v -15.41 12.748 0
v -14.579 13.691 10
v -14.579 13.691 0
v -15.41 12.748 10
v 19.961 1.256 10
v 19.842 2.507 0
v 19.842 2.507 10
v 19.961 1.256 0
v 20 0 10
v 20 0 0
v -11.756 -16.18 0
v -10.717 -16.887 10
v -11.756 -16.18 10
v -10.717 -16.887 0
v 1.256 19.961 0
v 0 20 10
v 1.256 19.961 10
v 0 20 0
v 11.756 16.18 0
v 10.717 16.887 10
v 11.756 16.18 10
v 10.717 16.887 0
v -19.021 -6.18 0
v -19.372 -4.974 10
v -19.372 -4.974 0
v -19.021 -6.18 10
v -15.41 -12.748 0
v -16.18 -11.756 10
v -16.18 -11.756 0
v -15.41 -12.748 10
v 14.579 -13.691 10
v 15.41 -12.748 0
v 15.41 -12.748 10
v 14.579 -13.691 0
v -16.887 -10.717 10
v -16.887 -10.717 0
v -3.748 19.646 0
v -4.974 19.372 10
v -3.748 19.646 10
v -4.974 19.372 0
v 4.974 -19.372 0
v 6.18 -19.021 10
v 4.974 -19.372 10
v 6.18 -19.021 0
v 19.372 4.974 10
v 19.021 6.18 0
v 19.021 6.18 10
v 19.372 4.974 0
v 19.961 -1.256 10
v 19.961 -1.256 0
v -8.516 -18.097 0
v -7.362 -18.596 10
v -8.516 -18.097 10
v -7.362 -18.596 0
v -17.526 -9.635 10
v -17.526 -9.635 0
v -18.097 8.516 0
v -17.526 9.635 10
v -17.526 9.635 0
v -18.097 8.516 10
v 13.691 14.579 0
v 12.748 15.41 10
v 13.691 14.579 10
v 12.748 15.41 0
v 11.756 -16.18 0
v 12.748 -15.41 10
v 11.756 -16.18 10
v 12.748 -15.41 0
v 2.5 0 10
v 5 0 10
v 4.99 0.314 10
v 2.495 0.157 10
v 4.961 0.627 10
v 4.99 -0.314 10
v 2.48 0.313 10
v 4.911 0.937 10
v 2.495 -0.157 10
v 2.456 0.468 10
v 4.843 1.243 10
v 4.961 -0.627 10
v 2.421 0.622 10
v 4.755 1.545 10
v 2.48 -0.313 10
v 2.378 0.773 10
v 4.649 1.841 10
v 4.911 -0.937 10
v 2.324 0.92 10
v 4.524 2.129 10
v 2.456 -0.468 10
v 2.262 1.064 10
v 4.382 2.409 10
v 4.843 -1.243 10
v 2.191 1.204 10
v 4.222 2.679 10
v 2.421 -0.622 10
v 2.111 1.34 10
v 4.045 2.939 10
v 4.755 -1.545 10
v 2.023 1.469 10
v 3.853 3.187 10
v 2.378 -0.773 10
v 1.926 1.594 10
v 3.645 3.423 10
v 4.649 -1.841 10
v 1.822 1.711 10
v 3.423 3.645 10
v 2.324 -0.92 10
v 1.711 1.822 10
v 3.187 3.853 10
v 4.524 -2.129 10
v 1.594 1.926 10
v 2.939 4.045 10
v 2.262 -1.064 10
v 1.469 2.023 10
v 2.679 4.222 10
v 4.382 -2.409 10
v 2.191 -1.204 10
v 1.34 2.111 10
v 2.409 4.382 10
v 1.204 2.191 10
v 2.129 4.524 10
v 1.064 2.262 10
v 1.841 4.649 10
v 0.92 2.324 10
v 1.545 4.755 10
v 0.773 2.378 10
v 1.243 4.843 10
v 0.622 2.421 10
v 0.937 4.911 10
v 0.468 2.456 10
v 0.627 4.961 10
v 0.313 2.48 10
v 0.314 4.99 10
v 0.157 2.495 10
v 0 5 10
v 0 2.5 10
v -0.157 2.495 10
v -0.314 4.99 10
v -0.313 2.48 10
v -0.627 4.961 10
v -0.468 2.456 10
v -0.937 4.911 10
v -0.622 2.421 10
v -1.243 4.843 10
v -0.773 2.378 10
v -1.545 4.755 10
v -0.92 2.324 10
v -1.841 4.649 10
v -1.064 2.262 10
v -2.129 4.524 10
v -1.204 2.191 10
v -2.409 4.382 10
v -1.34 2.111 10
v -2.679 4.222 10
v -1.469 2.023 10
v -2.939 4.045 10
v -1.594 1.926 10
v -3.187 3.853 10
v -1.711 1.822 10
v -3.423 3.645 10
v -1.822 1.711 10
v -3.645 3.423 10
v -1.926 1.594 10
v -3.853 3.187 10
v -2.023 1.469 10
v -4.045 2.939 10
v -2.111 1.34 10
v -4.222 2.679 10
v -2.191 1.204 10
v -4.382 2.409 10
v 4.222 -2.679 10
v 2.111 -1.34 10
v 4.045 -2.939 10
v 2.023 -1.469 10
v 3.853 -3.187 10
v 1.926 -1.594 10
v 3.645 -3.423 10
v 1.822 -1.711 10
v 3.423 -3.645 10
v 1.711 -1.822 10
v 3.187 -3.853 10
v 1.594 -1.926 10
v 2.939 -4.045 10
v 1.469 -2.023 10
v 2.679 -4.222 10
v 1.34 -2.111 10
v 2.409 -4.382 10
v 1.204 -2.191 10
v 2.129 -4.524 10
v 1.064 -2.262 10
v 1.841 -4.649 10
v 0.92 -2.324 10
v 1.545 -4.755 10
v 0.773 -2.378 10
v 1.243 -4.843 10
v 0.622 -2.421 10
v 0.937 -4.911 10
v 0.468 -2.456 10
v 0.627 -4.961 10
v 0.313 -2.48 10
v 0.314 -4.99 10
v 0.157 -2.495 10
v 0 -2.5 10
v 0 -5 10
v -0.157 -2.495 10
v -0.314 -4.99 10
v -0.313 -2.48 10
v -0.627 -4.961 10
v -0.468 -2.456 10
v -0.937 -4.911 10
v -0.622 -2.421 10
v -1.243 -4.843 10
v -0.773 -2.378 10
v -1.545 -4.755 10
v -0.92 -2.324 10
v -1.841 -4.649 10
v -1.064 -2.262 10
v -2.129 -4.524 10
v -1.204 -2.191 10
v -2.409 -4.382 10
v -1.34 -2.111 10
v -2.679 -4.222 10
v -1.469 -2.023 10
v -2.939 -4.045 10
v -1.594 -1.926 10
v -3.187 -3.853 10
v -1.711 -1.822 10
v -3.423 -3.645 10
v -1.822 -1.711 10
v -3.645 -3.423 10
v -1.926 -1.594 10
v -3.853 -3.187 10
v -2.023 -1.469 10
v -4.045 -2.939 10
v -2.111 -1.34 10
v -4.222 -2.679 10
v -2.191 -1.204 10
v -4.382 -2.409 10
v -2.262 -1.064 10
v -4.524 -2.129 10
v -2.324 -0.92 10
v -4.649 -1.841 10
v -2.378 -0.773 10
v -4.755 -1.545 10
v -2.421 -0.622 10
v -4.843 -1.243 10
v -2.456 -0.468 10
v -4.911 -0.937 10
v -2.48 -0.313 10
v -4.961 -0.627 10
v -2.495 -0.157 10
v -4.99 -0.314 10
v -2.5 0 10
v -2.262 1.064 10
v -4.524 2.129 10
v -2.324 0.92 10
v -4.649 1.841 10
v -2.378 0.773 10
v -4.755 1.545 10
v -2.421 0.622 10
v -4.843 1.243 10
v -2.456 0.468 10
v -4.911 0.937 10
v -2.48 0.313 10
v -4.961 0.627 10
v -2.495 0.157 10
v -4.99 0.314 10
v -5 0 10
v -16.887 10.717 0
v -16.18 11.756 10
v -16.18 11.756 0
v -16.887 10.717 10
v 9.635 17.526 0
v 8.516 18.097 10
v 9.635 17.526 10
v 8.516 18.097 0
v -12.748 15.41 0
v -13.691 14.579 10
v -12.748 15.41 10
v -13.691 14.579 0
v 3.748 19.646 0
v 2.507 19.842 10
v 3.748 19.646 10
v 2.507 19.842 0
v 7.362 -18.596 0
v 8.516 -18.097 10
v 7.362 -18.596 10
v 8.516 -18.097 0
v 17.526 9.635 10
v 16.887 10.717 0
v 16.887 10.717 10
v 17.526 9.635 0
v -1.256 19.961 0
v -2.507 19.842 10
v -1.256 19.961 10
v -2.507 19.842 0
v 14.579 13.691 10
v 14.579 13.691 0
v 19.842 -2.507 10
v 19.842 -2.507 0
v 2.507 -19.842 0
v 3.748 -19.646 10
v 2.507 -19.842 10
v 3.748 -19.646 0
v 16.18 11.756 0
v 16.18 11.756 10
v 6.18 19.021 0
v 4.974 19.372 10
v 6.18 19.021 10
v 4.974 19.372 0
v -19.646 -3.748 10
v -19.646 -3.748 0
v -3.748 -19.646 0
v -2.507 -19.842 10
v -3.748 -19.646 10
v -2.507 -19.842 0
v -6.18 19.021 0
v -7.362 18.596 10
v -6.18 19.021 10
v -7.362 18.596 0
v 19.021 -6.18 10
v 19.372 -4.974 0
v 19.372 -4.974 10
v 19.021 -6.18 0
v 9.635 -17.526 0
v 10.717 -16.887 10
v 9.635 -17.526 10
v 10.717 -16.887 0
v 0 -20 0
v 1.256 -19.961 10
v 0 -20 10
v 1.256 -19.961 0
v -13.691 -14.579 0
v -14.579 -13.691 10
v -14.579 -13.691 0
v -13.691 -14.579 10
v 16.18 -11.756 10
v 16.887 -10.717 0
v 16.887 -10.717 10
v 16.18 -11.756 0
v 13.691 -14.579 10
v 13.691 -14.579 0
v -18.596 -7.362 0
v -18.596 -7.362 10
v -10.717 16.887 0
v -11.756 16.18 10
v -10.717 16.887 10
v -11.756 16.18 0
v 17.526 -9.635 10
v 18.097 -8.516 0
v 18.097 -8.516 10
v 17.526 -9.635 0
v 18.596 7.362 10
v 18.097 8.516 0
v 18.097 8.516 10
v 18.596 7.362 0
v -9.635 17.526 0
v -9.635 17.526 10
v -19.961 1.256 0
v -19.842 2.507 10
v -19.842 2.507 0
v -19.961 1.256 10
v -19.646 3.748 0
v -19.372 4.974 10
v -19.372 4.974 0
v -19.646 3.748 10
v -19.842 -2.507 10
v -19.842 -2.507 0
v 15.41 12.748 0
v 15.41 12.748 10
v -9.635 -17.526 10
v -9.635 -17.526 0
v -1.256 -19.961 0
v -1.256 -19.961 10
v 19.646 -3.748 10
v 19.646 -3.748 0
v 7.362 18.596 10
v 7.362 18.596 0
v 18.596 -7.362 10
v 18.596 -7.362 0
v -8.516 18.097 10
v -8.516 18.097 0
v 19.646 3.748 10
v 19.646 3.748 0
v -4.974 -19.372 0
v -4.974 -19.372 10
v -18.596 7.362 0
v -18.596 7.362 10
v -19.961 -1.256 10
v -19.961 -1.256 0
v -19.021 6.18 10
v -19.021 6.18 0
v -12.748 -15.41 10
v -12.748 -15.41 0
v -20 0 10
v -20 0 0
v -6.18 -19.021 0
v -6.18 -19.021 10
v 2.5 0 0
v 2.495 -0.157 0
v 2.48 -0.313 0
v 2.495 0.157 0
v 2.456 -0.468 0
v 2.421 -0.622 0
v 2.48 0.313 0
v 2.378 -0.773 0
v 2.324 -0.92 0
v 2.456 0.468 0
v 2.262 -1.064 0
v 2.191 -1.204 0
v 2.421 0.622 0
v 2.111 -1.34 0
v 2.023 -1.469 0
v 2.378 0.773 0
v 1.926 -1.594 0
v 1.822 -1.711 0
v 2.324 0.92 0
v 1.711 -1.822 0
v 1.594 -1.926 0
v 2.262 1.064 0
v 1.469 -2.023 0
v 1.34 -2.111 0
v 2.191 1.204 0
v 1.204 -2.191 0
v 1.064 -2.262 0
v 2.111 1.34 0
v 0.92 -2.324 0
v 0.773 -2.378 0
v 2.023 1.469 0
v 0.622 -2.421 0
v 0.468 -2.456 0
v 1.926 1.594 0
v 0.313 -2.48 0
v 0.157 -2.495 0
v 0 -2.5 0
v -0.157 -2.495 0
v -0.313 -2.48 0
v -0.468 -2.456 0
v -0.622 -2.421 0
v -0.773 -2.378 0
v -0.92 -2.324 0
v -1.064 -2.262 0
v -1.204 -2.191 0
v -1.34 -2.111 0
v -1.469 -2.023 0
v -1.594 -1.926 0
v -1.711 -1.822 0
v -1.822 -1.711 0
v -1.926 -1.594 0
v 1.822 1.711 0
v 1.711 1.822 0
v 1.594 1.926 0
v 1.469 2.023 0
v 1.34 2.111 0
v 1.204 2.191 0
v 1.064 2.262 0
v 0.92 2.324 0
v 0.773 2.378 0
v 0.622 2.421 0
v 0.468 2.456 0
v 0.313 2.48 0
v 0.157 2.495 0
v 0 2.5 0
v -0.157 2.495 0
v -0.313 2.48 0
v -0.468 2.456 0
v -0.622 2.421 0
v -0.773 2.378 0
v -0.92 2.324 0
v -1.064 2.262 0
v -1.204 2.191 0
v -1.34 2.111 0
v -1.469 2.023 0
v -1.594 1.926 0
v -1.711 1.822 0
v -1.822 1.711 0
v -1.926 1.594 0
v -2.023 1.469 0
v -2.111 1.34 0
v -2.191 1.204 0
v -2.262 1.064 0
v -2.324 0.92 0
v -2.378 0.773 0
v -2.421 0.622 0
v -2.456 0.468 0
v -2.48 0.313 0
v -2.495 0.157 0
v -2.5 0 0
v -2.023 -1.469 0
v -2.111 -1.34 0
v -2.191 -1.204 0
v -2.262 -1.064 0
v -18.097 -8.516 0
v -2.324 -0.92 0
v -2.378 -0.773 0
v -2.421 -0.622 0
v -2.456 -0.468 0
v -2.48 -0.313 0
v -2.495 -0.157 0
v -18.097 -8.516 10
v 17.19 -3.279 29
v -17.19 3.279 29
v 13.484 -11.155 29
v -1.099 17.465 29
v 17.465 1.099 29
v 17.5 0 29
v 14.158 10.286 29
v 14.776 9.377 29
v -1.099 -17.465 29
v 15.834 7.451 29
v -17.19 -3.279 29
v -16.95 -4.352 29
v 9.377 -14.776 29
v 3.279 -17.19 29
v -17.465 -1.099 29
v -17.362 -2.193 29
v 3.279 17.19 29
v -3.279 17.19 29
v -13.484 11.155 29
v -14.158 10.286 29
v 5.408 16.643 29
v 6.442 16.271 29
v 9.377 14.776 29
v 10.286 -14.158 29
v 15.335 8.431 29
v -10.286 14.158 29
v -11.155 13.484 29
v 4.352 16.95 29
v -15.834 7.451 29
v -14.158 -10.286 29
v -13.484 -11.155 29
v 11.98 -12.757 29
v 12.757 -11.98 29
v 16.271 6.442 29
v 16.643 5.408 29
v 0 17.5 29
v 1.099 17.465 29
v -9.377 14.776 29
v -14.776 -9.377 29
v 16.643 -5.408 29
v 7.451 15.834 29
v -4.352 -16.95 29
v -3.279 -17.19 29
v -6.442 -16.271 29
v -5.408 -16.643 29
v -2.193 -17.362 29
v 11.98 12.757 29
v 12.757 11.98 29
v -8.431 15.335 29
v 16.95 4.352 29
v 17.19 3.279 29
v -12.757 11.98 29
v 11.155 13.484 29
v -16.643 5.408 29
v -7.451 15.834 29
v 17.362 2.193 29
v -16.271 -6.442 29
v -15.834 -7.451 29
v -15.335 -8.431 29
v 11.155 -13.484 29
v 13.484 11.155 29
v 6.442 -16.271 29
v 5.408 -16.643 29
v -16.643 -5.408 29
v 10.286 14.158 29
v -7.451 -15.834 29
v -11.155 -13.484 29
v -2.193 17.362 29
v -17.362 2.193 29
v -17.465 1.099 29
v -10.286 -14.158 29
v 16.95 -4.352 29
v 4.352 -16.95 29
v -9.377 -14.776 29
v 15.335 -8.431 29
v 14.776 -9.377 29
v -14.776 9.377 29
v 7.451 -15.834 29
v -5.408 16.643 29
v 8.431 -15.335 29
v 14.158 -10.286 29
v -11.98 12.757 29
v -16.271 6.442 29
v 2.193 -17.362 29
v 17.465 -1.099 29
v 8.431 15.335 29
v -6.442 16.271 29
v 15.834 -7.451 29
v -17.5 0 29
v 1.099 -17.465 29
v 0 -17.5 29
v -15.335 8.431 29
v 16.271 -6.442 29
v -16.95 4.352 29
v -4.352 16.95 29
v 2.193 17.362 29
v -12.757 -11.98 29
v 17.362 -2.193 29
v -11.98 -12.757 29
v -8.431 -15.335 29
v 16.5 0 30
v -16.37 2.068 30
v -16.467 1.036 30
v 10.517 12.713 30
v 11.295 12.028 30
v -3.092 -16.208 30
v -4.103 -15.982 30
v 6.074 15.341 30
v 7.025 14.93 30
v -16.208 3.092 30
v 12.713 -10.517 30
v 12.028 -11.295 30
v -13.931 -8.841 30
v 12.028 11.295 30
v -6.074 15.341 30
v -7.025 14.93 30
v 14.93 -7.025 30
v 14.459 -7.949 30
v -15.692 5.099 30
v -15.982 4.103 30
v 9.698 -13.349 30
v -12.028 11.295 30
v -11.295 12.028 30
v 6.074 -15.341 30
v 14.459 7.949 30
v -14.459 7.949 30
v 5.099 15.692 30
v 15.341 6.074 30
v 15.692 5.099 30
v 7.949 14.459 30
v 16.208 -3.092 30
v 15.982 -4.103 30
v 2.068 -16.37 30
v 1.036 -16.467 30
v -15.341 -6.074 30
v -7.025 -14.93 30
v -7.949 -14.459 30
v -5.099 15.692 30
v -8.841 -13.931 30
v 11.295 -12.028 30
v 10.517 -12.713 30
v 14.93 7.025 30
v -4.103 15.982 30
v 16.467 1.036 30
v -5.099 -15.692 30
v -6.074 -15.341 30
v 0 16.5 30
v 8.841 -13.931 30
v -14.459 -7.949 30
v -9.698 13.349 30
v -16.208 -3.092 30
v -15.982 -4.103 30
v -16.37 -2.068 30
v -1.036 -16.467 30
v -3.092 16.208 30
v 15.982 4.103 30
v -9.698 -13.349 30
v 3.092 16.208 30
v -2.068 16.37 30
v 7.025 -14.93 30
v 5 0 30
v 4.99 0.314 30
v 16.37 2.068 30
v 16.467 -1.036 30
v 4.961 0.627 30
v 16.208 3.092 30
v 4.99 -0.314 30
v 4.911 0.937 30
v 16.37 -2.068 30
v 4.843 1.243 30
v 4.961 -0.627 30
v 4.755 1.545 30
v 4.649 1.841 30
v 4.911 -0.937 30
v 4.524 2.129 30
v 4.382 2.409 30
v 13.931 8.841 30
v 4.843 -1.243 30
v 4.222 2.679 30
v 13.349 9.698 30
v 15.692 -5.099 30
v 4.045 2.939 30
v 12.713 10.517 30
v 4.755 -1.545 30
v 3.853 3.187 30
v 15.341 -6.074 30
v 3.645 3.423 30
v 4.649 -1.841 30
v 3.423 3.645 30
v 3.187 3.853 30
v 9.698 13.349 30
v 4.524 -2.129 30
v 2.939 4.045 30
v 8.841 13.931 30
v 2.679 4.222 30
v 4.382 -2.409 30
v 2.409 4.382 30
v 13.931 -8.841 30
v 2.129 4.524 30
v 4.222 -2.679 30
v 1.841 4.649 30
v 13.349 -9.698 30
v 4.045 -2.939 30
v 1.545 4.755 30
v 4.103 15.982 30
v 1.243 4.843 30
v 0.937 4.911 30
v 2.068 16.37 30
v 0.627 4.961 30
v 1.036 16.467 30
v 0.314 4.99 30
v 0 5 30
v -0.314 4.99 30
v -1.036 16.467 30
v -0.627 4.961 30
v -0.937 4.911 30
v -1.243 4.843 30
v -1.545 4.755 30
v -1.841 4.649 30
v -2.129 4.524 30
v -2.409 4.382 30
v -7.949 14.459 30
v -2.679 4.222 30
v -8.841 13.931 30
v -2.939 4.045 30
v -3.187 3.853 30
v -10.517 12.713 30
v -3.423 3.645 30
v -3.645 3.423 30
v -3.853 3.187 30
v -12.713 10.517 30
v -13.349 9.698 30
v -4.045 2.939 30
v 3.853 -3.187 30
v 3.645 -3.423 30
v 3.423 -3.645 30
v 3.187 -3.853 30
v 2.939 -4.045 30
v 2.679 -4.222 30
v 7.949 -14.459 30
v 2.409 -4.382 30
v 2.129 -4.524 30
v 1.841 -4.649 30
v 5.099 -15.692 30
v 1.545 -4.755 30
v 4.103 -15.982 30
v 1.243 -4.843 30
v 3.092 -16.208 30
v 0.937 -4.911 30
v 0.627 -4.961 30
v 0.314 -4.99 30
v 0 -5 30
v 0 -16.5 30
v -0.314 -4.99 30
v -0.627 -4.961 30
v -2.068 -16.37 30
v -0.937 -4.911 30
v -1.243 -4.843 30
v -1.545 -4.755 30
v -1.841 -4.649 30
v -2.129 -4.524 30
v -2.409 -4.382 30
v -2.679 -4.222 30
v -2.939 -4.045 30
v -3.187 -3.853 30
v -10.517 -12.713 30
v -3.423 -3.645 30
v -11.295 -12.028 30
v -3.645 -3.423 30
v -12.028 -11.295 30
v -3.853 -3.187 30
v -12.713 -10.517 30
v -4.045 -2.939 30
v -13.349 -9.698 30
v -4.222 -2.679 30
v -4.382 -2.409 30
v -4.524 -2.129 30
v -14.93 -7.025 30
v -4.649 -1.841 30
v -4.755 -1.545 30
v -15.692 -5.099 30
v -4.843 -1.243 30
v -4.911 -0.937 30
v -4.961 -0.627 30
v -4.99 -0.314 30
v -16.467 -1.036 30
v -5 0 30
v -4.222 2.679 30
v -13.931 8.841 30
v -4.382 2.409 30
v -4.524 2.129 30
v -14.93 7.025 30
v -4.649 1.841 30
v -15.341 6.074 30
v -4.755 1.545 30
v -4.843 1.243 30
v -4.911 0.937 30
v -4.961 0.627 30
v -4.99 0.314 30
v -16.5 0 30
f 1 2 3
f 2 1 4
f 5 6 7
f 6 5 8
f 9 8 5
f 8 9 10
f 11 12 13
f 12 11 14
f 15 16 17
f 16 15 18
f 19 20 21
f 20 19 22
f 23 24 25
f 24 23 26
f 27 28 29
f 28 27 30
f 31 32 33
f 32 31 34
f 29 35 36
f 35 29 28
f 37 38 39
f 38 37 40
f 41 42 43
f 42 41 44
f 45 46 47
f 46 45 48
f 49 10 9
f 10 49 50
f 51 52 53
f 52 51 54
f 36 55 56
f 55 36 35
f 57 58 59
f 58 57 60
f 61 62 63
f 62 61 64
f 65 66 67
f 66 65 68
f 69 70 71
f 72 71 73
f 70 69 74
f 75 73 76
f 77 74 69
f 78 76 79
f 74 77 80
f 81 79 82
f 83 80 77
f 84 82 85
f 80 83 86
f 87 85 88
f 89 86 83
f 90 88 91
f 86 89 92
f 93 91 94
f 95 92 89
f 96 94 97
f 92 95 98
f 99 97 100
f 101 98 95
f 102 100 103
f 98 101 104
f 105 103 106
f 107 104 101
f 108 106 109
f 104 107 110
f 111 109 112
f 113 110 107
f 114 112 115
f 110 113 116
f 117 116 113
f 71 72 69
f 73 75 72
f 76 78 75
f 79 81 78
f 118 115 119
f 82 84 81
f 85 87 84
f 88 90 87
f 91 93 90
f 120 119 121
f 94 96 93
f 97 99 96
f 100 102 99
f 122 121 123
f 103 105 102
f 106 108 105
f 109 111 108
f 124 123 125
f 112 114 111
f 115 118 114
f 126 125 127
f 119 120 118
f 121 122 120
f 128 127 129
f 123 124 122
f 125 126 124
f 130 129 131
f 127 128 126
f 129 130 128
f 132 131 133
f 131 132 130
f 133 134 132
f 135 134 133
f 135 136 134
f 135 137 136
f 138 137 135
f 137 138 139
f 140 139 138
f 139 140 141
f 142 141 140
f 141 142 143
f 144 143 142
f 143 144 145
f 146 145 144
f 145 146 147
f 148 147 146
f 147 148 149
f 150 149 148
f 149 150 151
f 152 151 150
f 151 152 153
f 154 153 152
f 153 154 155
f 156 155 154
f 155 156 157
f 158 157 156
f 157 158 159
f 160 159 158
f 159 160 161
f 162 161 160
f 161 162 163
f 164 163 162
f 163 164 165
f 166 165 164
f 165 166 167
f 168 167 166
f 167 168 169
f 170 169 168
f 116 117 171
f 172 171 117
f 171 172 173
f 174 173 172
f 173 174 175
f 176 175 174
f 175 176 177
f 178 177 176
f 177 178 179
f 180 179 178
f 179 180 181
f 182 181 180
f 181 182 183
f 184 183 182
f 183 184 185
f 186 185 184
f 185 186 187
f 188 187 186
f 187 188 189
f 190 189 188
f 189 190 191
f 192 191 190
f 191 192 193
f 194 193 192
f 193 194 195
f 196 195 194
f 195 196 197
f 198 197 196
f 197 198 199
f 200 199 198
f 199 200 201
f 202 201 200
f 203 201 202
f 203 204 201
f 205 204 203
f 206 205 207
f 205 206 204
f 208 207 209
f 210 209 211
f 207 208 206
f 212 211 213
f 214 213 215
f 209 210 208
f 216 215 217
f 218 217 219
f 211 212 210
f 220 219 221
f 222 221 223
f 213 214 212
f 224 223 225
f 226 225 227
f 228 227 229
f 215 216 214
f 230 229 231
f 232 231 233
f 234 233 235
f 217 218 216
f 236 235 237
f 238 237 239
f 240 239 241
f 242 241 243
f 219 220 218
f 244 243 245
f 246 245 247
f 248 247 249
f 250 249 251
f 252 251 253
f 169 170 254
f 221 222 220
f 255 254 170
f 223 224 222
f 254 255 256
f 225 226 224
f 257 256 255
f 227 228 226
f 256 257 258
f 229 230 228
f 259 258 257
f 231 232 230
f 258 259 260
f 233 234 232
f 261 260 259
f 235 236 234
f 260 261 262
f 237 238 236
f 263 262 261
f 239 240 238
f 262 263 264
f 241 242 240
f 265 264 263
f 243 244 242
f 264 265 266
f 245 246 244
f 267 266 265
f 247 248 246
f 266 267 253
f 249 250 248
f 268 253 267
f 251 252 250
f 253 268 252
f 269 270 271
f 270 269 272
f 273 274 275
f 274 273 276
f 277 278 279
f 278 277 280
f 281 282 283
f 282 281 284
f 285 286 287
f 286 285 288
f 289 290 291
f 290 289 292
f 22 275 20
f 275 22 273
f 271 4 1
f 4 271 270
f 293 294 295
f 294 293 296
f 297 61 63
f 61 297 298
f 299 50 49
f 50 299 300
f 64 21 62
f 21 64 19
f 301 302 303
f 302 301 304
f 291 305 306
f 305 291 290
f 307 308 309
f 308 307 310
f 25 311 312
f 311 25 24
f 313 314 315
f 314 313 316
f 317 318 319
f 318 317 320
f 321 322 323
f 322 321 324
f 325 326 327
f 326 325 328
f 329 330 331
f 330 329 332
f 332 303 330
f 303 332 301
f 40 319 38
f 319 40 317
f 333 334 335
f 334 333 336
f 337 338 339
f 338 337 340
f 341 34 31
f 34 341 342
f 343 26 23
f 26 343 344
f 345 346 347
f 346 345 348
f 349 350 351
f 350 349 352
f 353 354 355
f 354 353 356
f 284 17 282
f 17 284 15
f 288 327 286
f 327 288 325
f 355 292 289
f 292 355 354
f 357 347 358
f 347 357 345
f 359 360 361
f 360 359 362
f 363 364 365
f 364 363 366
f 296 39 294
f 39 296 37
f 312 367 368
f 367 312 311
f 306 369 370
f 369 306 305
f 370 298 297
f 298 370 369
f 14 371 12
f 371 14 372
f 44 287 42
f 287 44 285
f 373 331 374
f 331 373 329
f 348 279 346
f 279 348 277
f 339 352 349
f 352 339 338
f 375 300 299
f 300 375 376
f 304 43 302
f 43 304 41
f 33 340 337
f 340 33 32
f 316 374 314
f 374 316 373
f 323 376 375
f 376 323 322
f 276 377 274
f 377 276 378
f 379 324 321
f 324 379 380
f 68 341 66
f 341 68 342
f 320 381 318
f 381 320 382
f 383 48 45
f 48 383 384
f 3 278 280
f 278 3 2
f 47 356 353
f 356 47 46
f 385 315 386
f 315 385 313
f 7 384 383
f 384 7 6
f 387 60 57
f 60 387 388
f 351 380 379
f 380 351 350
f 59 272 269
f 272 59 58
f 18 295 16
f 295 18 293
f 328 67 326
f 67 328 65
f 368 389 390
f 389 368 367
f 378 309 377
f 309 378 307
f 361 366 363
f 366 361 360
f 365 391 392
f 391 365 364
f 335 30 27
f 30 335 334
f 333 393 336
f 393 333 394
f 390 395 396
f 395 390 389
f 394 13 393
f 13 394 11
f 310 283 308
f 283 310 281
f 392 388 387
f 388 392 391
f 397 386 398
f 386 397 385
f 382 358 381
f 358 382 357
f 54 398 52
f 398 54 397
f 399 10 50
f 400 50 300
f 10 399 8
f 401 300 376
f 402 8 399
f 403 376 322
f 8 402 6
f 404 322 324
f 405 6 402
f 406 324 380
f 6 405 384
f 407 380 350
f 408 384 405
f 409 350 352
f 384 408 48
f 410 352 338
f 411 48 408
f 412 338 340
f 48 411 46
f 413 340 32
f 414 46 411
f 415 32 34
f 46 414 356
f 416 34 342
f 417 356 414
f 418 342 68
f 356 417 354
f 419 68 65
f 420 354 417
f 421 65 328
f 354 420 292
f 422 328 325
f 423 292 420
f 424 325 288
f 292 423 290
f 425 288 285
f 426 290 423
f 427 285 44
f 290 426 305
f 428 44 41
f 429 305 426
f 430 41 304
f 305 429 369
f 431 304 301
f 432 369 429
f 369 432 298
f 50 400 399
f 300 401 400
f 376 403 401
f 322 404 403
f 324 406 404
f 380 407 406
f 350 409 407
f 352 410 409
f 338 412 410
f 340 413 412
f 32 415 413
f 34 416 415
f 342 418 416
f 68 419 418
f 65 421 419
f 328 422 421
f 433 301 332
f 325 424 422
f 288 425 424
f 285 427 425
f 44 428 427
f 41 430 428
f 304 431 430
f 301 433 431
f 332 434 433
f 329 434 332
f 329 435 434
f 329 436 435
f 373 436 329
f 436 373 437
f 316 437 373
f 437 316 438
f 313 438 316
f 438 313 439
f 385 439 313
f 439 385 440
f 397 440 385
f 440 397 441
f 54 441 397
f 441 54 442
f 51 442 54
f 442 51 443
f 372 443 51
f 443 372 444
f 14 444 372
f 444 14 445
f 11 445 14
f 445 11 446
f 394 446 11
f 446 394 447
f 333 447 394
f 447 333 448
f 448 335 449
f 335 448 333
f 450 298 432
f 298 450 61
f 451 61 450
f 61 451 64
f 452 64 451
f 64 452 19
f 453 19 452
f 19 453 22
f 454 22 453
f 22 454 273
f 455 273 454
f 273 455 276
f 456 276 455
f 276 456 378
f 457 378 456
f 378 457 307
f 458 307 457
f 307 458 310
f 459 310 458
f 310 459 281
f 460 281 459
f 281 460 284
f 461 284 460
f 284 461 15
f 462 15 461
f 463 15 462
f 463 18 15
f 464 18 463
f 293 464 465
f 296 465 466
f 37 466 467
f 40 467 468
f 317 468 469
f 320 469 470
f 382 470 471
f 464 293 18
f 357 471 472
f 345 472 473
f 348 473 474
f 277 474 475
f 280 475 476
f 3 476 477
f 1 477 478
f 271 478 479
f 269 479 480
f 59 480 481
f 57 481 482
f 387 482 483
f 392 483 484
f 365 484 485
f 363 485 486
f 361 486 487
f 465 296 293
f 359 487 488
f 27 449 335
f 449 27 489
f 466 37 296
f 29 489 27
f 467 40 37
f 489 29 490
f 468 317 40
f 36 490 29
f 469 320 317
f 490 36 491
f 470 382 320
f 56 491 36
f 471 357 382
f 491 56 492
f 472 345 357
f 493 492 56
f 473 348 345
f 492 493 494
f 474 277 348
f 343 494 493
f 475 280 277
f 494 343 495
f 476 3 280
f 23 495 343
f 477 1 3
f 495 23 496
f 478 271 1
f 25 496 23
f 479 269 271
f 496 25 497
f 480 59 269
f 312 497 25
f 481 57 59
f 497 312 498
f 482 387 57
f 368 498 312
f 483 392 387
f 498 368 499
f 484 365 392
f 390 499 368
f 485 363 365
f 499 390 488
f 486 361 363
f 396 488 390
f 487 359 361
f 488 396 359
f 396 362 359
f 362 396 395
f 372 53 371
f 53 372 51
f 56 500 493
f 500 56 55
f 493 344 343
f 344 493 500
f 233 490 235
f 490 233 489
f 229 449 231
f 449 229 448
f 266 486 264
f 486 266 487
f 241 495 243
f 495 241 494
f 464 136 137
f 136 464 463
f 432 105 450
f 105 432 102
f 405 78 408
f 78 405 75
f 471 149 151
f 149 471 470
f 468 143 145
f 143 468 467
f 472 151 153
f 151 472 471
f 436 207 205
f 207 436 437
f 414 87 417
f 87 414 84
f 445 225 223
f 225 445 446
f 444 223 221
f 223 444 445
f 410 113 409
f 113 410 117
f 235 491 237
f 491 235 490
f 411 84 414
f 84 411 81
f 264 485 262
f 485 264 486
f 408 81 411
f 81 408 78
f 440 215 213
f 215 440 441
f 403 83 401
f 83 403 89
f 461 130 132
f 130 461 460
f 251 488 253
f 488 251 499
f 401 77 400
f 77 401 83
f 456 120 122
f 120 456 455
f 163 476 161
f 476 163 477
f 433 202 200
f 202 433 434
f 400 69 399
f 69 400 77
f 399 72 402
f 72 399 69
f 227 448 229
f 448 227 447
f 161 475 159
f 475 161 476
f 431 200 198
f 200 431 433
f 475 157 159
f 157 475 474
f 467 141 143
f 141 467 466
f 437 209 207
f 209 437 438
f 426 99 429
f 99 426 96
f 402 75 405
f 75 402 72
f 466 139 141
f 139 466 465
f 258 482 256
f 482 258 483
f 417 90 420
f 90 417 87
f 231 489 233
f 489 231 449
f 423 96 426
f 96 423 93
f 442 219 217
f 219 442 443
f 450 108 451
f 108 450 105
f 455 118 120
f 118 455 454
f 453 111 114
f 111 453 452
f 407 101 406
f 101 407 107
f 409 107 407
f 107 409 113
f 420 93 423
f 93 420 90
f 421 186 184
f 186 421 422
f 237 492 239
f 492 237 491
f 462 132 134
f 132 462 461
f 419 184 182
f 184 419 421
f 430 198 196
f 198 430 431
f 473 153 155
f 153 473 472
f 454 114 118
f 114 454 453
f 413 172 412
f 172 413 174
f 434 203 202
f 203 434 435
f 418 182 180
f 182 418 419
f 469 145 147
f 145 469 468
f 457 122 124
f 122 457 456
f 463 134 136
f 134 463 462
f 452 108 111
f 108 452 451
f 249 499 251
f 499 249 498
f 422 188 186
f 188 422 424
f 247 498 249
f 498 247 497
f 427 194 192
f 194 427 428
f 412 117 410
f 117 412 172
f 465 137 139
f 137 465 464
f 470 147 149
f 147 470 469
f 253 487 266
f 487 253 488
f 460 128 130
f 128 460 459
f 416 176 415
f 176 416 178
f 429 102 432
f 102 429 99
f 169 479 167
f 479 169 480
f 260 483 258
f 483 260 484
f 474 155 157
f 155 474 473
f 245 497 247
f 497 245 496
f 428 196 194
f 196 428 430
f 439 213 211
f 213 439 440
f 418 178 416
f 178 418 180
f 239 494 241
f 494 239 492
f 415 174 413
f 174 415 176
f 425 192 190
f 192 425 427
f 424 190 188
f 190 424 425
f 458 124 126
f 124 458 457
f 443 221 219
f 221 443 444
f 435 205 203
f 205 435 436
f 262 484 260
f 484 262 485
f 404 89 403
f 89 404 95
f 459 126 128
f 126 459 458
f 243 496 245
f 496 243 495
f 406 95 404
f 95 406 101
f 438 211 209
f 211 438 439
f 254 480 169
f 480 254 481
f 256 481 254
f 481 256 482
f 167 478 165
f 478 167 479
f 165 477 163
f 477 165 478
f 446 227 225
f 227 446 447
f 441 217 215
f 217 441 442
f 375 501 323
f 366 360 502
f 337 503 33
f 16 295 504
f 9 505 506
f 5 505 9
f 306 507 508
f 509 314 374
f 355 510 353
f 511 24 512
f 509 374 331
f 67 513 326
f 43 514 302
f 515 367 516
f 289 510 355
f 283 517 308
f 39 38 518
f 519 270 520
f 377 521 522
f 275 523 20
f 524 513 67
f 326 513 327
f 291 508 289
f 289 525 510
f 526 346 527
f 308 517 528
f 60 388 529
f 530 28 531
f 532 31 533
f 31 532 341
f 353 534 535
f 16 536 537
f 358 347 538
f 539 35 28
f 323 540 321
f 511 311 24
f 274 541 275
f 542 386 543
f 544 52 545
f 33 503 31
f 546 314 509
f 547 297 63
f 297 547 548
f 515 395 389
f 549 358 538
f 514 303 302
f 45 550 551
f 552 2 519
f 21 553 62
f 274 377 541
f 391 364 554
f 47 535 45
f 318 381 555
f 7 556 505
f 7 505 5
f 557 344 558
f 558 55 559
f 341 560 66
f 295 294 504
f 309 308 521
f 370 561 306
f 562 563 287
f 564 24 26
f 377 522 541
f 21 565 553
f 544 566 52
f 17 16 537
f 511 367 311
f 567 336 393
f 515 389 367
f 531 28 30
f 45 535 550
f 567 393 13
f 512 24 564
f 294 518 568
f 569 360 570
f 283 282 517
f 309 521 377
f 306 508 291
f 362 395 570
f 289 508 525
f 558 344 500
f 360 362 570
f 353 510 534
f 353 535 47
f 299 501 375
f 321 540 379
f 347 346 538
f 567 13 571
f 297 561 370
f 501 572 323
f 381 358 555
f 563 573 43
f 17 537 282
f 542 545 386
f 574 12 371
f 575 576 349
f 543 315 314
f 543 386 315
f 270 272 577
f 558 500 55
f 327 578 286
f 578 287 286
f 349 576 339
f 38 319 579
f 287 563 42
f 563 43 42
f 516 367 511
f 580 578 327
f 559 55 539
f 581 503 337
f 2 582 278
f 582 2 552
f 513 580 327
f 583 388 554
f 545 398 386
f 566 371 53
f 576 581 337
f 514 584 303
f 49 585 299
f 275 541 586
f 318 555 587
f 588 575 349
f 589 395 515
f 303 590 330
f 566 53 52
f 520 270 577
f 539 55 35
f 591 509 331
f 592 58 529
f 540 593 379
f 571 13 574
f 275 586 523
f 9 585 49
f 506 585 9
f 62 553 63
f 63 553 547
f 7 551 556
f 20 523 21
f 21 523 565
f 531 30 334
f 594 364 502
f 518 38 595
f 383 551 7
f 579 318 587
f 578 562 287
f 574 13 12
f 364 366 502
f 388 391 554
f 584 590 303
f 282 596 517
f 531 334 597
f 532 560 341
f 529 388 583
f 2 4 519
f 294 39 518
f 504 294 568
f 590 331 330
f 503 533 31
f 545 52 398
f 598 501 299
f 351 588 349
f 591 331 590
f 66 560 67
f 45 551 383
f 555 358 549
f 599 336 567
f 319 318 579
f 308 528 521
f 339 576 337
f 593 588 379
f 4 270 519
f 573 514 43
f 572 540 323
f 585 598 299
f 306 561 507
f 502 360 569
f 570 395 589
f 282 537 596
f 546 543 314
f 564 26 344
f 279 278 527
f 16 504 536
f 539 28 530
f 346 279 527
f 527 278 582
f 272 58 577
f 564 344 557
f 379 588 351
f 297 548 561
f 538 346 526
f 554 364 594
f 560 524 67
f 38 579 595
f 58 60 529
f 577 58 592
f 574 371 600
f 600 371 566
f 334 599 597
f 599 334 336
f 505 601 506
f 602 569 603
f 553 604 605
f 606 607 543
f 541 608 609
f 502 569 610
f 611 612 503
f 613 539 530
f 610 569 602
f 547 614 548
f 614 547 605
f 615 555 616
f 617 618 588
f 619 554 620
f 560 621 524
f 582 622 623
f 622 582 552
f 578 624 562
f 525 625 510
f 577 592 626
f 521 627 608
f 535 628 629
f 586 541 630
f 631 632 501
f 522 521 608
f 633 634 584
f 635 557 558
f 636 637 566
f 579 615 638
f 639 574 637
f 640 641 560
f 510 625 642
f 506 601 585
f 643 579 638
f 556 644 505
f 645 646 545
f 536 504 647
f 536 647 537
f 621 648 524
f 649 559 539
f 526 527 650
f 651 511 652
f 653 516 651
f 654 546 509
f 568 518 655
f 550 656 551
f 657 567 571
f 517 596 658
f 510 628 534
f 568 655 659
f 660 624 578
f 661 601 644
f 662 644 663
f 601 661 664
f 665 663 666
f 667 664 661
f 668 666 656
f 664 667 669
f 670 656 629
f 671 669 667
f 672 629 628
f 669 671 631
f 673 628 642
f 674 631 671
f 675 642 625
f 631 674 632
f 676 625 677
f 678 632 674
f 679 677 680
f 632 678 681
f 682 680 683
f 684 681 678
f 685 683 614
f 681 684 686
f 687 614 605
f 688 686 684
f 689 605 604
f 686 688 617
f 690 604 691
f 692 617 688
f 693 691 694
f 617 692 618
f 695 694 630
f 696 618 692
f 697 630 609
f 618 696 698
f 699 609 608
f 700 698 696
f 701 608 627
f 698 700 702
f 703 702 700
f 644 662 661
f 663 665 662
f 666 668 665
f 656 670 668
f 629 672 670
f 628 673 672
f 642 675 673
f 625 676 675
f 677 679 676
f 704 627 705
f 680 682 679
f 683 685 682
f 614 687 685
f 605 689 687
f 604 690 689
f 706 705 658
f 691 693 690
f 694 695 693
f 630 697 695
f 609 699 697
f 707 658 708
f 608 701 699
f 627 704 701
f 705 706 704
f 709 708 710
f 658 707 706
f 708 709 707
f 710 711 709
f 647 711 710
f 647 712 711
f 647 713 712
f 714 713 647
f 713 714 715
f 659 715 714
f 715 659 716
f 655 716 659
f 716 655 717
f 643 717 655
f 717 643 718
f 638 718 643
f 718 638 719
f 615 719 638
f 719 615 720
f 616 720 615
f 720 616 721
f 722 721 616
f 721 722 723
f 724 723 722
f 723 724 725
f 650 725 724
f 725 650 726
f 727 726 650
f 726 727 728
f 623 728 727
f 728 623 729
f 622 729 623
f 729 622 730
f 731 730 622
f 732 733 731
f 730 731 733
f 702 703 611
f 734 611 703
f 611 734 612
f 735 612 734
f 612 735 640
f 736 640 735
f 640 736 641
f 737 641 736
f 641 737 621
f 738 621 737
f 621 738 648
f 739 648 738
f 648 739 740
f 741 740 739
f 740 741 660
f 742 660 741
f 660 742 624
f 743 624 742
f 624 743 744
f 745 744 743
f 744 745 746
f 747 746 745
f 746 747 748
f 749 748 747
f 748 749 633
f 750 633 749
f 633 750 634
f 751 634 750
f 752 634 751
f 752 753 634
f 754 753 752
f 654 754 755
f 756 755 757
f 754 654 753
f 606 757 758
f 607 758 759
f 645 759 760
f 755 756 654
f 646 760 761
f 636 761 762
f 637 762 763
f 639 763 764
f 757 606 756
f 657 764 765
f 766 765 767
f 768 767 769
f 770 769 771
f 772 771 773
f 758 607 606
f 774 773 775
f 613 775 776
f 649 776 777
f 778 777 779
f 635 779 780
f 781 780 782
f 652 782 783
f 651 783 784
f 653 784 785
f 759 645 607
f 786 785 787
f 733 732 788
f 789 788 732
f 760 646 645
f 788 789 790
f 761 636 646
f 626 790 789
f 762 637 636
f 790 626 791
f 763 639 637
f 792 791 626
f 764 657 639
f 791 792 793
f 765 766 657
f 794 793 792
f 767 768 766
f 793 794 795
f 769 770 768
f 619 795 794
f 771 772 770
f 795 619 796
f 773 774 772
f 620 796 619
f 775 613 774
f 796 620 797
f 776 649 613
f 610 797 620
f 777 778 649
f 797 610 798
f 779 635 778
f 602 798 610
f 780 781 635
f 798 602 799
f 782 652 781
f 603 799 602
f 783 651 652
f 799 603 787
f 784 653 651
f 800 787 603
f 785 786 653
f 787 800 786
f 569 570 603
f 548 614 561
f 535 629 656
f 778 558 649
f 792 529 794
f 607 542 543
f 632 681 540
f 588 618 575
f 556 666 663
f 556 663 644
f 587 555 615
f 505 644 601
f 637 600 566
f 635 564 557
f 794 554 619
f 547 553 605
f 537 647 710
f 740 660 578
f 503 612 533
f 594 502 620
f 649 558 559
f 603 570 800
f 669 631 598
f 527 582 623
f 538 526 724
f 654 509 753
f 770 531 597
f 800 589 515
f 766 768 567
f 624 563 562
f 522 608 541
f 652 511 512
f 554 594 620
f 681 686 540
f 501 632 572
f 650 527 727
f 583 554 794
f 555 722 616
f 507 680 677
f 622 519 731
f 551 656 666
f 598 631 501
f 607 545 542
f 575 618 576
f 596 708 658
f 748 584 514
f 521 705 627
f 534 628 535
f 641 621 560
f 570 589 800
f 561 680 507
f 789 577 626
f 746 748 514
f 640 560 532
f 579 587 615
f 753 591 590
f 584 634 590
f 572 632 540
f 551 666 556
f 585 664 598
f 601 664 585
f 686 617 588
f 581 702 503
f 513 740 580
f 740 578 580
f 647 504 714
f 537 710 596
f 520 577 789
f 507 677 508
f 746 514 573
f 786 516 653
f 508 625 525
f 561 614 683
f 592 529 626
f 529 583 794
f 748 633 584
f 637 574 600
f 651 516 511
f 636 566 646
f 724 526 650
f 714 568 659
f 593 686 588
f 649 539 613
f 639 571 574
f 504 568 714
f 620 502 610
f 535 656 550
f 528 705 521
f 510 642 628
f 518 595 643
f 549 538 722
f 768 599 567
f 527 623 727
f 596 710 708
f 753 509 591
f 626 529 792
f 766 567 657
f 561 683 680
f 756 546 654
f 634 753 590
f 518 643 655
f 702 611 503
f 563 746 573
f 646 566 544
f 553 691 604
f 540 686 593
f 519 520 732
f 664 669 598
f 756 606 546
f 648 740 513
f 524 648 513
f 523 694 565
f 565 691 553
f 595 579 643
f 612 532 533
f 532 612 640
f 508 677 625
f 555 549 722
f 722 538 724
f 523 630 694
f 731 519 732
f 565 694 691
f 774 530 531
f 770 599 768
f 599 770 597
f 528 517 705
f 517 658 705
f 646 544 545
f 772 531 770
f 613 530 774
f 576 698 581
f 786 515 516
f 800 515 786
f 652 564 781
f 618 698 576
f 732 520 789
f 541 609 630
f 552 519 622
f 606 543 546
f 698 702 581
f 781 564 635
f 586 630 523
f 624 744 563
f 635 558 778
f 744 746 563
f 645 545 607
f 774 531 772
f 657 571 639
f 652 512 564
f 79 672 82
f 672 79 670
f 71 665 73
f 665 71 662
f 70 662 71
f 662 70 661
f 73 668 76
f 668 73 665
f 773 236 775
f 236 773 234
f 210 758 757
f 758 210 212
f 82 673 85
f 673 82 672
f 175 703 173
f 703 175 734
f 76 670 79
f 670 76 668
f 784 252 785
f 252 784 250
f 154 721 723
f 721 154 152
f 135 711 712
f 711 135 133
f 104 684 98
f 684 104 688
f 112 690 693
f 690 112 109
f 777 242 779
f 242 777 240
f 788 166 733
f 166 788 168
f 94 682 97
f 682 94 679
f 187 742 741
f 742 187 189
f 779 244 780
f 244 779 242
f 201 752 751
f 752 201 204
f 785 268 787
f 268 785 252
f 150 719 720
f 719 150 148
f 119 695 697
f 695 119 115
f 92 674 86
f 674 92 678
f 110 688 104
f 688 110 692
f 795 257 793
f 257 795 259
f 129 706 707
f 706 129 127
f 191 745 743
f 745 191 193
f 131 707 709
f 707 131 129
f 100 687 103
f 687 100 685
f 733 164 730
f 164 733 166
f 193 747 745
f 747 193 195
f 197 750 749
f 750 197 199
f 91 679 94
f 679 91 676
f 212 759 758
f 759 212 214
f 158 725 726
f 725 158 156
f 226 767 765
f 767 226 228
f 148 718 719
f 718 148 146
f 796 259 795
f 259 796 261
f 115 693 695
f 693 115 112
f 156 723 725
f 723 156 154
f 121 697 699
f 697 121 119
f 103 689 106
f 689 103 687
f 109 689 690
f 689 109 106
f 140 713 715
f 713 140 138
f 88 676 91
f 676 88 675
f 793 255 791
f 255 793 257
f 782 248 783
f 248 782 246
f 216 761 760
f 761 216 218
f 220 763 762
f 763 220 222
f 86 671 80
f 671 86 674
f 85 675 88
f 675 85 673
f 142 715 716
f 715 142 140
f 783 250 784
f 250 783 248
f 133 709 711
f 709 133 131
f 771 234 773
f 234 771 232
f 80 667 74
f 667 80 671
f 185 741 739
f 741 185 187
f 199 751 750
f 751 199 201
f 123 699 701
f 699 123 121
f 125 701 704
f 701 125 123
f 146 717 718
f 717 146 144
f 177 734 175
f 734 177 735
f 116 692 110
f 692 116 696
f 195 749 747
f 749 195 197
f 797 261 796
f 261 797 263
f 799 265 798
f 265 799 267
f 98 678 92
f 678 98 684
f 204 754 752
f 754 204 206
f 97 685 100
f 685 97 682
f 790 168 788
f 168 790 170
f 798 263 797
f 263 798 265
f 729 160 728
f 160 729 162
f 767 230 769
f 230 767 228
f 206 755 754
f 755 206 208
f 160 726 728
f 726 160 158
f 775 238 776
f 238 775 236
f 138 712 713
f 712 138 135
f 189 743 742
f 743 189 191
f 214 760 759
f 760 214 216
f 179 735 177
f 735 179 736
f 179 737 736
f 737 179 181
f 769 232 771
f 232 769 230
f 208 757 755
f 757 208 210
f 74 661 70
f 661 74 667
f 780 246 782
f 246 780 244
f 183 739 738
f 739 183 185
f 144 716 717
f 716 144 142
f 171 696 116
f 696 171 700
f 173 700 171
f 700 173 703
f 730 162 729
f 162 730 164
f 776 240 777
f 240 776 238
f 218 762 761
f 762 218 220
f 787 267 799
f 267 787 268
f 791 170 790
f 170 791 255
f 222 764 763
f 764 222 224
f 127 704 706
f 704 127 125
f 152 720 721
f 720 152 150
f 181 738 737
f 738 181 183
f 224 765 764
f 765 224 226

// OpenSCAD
// furniture_foot.scad
// library for parametric furniture foot, leg, pad, protector, standoff
// Author: Tony Z. Tonchev, Michigan (USA) 
// last update: November 2018


// Crossection, number of sides (100 = round)
Crossection_Sides = 100; //[3,4,5,6,8,12,100]

// Size/Diameter (in mm)
Base_Diameter = 40; //[10:160]

// Size/Diameter (in mm)
Tip_Diameter = 35; //[10:160]

// (in mm)
Base_Height = 10; //[5:30]

// (in mm)
Stem_Height = 20; //[5:160]

// (in mm)
Screw_Head_Diameter = 10; //[5:30]

// (in mm)
Screw_Shaft_Diameter = 5; //[2:10]


/* [Hidden] */

TZT_BD = Base_Diameter/2;
TZT_TD = Tip_Diameter/2;
TZT_BH = Base_Height;
TZT_SH = Stem_Height;
TZT_HH = Screw_Head_Diameter/2;
TZT_HS = Screw_Shaft_Diameter/2;

$fn=Crossection_Sides;

TZT_FOOT ();

module TZT_FOOT () {
    difference () {
        cylinder (TZT_BH, TZT_BD, TZT_BD);
        cylinder (TZT_BH, TZT_HS, TZT_HS, $fn=100);
    }
    translate ([0,0,TZT_BH]) {
        difference () {
            union () {
                cylinder (TZT_SH-1, TZT_BD, TZT_TD);
                translate ([0,0,TZT_SH-1]) {
                    cylinder (1, TZT_TD, TZT_TD-1);
                }
            }
            cylinder (TZT_SH+1, TZT_HH, TZT_HH, $fn=100);
        }
    }
}
